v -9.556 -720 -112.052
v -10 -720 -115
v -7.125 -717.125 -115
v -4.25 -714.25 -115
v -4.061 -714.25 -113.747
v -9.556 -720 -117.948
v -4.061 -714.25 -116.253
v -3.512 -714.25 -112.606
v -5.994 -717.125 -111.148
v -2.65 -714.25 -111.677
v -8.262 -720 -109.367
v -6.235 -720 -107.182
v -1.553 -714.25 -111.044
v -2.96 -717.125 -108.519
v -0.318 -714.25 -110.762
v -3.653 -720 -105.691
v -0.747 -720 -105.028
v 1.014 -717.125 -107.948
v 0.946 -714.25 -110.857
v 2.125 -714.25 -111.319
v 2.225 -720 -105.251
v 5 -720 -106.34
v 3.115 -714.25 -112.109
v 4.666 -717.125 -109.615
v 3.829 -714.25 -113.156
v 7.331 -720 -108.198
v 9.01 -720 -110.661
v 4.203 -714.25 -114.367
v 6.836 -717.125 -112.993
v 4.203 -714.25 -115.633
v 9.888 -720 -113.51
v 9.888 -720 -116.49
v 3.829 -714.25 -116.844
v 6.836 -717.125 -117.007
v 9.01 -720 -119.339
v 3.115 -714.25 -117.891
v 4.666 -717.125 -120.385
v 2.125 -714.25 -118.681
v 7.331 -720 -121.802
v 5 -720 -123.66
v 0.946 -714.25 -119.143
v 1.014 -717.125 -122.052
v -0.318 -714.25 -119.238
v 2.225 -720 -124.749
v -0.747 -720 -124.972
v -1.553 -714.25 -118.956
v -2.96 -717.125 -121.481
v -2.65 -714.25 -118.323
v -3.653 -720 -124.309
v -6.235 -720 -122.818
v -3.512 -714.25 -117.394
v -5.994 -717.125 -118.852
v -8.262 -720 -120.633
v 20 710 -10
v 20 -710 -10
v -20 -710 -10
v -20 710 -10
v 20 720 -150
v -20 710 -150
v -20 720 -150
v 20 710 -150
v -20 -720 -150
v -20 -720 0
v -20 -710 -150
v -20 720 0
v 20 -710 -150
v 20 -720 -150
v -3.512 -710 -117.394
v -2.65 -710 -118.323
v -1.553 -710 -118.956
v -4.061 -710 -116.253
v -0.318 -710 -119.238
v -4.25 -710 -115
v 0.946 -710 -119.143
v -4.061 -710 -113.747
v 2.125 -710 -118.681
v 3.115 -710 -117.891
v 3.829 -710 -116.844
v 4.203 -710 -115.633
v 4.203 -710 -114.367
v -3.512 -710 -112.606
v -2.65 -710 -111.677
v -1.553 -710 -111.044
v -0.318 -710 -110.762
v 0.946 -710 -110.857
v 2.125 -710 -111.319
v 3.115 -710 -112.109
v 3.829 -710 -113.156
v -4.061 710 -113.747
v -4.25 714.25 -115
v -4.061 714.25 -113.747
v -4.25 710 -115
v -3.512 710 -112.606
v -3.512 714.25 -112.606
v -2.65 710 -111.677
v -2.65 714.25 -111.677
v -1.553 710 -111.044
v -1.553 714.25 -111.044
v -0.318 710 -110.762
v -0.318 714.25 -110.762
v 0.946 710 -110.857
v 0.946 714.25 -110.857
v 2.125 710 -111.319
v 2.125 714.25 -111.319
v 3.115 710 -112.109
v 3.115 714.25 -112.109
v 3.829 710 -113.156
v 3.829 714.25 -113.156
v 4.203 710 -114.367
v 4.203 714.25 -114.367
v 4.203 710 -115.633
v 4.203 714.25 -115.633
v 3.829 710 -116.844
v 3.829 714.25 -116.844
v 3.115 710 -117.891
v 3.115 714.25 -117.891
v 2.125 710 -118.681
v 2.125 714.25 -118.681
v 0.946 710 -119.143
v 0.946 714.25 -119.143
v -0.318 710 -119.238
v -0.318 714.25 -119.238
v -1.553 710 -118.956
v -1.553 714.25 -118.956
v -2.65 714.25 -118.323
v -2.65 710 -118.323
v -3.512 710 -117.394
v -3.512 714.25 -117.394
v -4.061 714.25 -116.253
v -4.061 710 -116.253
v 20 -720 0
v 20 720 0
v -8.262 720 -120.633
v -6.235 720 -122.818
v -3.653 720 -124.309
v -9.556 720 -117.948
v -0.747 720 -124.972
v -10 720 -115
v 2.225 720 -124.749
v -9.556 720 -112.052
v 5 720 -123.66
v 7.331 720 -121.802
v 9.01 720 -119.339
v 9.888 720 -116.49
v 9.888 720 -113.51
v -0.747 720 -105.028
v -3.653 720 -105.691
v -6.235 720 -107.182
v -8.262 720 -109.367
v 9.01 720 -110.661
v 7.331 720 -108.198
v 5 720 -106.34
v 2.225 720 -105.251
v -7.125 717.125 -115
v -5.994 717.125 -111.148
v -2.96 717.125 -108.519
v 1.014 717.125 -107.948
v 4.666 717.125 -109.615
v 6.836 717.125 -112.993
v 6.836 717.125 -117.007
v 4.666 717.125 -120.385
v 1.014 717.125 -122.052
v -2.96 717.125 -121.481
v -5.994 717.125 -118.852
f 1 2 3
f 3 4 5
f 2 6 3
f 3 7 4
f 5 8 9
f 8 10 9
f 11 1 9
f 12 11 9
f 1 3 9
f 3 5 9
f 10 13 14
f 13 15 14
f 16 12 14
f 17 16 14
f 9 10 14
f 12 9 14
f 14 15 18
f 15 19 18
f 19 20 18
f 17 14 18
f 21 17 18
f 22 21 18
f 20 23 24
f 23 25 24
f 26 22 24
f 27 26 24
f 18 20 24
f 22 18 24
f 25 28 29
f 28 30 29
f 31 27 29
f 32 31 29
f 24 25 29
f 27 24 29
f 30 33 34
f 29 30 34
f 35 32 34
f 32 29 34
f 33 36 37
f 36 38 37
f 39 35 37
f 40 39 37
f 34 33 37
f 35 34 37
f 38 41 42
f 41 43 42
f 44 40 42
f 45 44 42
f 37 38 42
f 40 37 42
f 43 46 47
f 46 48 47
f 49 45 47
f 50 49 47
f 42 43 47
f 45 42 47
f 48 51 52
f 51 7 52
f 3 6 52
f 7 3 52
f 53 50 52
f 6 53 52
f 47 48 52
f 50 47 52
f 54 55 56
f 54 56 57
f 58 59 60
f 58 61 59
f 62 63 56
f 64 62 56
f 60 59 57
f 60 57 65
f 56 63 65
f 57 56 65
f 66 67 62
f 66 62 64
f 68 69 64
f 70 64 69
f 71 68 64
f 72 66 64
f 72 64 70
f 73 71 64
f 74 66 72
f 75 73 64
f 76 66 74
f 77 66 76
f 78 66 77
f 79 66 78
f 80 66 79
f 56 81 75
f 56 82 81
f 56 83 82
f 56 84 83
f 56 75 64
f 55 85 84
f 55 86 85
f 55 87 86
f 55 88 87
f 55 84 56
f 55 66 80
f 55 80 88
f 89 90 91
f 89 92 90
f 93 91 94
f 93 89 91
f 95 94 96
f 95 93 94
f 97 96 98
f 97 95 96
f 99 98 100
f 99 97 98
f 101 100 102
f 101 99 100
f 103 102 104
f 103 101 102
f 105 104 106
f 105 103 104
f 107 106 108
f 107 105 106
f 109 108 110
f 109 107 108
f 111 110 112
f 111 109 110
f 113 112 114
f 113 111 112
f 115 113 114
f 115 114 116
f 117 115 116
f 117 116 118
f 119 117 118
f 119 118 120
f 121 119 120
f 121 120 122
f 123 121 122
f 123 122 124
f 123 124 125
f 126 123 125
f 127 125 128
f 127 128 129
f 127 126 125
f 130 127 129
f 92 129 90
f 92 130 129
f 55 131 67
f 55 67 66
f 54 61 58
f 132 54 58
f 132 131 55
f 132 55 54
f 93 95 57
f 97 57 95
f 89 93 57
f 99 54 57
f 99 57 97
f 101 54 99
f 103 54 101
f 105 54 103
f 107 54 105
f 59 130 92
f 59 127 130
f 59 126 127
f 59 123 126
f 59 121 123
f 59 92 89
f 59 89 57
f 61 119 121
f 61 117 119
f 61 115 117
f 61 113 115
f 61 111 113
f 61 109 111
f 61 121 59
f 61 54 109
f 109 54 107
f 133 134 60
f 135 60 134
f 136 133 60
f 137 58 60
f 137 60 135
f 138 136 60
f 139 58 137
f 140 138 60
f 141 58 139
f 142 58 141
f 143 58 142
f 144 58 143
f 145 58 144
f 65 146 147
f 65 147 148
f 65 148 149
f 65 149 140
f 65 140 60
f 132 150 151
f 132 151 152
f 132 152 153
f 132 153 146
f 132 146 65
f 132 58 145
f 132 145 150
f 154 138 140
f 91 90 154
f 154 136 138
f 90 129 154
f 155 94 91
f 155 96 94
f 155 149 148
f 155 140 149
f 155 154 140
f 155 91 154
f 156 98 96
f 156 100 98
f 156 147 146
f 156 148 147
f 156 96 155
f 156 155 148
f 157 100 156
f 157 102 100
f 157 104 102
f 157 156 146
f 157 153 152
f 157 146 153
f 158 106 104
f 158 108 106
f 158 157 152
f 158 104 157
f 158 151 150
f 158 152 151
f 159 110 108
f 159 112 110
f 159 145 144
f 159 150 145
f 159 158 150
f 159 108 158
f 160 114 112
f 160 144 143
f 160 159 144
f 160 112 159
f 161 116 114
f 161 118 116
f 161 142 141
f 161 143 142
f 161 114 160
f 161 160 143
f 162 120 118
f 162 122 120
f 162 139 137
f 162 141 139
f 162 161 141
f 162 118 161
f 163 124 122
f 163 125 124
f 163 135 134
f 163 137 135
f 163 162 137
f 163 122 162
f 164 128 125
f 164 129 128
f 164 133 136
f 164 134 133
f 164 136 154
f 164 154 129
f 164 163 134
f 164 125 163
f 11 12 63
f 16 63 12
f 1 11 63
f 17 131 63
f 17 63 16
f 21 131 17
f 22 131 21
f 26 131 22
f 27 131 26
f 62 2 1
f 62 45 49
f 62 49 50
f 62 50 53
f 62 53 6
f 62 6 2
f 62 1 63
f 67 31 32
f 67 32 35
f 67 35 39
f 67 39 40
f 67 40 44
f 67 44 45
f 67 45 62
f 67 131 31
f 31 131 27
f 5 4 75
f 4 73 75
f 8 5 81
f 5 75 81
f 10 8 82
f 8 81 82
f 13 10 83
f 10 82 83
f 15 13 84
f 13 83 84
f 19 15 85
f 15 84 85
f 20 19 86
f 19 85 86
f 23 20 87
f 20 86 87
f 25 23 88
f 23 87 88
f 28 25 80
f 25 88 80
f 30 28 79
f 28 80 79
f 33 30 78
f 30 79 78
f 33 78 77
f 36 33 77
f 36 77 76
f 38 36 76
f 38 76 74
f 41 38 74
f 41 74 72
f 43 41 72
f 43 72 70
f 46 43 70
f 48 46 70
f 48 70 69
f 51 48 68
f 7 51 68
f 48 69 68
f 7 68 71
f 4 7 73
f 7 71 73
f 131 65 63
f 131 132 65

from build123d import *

# Parameters (mm, degrees)
F1_DEPTH       = 20
F3_D           = 8.5
F3_DEPTH       = 15
F3_CSINK_D     = 20
F3_CSINK_ANGLE = 90
F3_TIP         = 2.5536576309


# Not quite as in the source:
# - a pattern or mirror of a feature is missing from the dataset's text; its kind, count and spacing are read off the source's solid


with BuildPart() as f1:
    # F0 (on Right) → F1 (new body, symmetric)
    with BuildSketch(Plane.YZ):
        Polygon((720, 0), (0, 0), (-720, 0), (-720, -150), (-710, -150), (-710, -10), (0, -10), (710, -10), (710, -150), (720, -150), align=None)
    extrude(amount=F1_DEPTH, both=True)

    # F3
    with Locations(Plane.XZ.offset(720)):
        with Locations((0, -115)):
            f3 = CounterSinkHole(F3_D / 2, F3_CSINK_D / 2, depth=F3_DEPTH, counter_sink_angle=F3_CSINK_ANGLE)
            with Locations((0, 0, -(F3_DEPTH + F3_TIP / 2))):  # 118° drill point
                Cone(0, F3_D / 2, F3_TIP, mode=Mode.SUBTRACT)

    # F3_copies: F3 across plane
    add(f3.mirror(Plane.ZX), mode=Mode.SUBTRACT)


solid = f1.part
